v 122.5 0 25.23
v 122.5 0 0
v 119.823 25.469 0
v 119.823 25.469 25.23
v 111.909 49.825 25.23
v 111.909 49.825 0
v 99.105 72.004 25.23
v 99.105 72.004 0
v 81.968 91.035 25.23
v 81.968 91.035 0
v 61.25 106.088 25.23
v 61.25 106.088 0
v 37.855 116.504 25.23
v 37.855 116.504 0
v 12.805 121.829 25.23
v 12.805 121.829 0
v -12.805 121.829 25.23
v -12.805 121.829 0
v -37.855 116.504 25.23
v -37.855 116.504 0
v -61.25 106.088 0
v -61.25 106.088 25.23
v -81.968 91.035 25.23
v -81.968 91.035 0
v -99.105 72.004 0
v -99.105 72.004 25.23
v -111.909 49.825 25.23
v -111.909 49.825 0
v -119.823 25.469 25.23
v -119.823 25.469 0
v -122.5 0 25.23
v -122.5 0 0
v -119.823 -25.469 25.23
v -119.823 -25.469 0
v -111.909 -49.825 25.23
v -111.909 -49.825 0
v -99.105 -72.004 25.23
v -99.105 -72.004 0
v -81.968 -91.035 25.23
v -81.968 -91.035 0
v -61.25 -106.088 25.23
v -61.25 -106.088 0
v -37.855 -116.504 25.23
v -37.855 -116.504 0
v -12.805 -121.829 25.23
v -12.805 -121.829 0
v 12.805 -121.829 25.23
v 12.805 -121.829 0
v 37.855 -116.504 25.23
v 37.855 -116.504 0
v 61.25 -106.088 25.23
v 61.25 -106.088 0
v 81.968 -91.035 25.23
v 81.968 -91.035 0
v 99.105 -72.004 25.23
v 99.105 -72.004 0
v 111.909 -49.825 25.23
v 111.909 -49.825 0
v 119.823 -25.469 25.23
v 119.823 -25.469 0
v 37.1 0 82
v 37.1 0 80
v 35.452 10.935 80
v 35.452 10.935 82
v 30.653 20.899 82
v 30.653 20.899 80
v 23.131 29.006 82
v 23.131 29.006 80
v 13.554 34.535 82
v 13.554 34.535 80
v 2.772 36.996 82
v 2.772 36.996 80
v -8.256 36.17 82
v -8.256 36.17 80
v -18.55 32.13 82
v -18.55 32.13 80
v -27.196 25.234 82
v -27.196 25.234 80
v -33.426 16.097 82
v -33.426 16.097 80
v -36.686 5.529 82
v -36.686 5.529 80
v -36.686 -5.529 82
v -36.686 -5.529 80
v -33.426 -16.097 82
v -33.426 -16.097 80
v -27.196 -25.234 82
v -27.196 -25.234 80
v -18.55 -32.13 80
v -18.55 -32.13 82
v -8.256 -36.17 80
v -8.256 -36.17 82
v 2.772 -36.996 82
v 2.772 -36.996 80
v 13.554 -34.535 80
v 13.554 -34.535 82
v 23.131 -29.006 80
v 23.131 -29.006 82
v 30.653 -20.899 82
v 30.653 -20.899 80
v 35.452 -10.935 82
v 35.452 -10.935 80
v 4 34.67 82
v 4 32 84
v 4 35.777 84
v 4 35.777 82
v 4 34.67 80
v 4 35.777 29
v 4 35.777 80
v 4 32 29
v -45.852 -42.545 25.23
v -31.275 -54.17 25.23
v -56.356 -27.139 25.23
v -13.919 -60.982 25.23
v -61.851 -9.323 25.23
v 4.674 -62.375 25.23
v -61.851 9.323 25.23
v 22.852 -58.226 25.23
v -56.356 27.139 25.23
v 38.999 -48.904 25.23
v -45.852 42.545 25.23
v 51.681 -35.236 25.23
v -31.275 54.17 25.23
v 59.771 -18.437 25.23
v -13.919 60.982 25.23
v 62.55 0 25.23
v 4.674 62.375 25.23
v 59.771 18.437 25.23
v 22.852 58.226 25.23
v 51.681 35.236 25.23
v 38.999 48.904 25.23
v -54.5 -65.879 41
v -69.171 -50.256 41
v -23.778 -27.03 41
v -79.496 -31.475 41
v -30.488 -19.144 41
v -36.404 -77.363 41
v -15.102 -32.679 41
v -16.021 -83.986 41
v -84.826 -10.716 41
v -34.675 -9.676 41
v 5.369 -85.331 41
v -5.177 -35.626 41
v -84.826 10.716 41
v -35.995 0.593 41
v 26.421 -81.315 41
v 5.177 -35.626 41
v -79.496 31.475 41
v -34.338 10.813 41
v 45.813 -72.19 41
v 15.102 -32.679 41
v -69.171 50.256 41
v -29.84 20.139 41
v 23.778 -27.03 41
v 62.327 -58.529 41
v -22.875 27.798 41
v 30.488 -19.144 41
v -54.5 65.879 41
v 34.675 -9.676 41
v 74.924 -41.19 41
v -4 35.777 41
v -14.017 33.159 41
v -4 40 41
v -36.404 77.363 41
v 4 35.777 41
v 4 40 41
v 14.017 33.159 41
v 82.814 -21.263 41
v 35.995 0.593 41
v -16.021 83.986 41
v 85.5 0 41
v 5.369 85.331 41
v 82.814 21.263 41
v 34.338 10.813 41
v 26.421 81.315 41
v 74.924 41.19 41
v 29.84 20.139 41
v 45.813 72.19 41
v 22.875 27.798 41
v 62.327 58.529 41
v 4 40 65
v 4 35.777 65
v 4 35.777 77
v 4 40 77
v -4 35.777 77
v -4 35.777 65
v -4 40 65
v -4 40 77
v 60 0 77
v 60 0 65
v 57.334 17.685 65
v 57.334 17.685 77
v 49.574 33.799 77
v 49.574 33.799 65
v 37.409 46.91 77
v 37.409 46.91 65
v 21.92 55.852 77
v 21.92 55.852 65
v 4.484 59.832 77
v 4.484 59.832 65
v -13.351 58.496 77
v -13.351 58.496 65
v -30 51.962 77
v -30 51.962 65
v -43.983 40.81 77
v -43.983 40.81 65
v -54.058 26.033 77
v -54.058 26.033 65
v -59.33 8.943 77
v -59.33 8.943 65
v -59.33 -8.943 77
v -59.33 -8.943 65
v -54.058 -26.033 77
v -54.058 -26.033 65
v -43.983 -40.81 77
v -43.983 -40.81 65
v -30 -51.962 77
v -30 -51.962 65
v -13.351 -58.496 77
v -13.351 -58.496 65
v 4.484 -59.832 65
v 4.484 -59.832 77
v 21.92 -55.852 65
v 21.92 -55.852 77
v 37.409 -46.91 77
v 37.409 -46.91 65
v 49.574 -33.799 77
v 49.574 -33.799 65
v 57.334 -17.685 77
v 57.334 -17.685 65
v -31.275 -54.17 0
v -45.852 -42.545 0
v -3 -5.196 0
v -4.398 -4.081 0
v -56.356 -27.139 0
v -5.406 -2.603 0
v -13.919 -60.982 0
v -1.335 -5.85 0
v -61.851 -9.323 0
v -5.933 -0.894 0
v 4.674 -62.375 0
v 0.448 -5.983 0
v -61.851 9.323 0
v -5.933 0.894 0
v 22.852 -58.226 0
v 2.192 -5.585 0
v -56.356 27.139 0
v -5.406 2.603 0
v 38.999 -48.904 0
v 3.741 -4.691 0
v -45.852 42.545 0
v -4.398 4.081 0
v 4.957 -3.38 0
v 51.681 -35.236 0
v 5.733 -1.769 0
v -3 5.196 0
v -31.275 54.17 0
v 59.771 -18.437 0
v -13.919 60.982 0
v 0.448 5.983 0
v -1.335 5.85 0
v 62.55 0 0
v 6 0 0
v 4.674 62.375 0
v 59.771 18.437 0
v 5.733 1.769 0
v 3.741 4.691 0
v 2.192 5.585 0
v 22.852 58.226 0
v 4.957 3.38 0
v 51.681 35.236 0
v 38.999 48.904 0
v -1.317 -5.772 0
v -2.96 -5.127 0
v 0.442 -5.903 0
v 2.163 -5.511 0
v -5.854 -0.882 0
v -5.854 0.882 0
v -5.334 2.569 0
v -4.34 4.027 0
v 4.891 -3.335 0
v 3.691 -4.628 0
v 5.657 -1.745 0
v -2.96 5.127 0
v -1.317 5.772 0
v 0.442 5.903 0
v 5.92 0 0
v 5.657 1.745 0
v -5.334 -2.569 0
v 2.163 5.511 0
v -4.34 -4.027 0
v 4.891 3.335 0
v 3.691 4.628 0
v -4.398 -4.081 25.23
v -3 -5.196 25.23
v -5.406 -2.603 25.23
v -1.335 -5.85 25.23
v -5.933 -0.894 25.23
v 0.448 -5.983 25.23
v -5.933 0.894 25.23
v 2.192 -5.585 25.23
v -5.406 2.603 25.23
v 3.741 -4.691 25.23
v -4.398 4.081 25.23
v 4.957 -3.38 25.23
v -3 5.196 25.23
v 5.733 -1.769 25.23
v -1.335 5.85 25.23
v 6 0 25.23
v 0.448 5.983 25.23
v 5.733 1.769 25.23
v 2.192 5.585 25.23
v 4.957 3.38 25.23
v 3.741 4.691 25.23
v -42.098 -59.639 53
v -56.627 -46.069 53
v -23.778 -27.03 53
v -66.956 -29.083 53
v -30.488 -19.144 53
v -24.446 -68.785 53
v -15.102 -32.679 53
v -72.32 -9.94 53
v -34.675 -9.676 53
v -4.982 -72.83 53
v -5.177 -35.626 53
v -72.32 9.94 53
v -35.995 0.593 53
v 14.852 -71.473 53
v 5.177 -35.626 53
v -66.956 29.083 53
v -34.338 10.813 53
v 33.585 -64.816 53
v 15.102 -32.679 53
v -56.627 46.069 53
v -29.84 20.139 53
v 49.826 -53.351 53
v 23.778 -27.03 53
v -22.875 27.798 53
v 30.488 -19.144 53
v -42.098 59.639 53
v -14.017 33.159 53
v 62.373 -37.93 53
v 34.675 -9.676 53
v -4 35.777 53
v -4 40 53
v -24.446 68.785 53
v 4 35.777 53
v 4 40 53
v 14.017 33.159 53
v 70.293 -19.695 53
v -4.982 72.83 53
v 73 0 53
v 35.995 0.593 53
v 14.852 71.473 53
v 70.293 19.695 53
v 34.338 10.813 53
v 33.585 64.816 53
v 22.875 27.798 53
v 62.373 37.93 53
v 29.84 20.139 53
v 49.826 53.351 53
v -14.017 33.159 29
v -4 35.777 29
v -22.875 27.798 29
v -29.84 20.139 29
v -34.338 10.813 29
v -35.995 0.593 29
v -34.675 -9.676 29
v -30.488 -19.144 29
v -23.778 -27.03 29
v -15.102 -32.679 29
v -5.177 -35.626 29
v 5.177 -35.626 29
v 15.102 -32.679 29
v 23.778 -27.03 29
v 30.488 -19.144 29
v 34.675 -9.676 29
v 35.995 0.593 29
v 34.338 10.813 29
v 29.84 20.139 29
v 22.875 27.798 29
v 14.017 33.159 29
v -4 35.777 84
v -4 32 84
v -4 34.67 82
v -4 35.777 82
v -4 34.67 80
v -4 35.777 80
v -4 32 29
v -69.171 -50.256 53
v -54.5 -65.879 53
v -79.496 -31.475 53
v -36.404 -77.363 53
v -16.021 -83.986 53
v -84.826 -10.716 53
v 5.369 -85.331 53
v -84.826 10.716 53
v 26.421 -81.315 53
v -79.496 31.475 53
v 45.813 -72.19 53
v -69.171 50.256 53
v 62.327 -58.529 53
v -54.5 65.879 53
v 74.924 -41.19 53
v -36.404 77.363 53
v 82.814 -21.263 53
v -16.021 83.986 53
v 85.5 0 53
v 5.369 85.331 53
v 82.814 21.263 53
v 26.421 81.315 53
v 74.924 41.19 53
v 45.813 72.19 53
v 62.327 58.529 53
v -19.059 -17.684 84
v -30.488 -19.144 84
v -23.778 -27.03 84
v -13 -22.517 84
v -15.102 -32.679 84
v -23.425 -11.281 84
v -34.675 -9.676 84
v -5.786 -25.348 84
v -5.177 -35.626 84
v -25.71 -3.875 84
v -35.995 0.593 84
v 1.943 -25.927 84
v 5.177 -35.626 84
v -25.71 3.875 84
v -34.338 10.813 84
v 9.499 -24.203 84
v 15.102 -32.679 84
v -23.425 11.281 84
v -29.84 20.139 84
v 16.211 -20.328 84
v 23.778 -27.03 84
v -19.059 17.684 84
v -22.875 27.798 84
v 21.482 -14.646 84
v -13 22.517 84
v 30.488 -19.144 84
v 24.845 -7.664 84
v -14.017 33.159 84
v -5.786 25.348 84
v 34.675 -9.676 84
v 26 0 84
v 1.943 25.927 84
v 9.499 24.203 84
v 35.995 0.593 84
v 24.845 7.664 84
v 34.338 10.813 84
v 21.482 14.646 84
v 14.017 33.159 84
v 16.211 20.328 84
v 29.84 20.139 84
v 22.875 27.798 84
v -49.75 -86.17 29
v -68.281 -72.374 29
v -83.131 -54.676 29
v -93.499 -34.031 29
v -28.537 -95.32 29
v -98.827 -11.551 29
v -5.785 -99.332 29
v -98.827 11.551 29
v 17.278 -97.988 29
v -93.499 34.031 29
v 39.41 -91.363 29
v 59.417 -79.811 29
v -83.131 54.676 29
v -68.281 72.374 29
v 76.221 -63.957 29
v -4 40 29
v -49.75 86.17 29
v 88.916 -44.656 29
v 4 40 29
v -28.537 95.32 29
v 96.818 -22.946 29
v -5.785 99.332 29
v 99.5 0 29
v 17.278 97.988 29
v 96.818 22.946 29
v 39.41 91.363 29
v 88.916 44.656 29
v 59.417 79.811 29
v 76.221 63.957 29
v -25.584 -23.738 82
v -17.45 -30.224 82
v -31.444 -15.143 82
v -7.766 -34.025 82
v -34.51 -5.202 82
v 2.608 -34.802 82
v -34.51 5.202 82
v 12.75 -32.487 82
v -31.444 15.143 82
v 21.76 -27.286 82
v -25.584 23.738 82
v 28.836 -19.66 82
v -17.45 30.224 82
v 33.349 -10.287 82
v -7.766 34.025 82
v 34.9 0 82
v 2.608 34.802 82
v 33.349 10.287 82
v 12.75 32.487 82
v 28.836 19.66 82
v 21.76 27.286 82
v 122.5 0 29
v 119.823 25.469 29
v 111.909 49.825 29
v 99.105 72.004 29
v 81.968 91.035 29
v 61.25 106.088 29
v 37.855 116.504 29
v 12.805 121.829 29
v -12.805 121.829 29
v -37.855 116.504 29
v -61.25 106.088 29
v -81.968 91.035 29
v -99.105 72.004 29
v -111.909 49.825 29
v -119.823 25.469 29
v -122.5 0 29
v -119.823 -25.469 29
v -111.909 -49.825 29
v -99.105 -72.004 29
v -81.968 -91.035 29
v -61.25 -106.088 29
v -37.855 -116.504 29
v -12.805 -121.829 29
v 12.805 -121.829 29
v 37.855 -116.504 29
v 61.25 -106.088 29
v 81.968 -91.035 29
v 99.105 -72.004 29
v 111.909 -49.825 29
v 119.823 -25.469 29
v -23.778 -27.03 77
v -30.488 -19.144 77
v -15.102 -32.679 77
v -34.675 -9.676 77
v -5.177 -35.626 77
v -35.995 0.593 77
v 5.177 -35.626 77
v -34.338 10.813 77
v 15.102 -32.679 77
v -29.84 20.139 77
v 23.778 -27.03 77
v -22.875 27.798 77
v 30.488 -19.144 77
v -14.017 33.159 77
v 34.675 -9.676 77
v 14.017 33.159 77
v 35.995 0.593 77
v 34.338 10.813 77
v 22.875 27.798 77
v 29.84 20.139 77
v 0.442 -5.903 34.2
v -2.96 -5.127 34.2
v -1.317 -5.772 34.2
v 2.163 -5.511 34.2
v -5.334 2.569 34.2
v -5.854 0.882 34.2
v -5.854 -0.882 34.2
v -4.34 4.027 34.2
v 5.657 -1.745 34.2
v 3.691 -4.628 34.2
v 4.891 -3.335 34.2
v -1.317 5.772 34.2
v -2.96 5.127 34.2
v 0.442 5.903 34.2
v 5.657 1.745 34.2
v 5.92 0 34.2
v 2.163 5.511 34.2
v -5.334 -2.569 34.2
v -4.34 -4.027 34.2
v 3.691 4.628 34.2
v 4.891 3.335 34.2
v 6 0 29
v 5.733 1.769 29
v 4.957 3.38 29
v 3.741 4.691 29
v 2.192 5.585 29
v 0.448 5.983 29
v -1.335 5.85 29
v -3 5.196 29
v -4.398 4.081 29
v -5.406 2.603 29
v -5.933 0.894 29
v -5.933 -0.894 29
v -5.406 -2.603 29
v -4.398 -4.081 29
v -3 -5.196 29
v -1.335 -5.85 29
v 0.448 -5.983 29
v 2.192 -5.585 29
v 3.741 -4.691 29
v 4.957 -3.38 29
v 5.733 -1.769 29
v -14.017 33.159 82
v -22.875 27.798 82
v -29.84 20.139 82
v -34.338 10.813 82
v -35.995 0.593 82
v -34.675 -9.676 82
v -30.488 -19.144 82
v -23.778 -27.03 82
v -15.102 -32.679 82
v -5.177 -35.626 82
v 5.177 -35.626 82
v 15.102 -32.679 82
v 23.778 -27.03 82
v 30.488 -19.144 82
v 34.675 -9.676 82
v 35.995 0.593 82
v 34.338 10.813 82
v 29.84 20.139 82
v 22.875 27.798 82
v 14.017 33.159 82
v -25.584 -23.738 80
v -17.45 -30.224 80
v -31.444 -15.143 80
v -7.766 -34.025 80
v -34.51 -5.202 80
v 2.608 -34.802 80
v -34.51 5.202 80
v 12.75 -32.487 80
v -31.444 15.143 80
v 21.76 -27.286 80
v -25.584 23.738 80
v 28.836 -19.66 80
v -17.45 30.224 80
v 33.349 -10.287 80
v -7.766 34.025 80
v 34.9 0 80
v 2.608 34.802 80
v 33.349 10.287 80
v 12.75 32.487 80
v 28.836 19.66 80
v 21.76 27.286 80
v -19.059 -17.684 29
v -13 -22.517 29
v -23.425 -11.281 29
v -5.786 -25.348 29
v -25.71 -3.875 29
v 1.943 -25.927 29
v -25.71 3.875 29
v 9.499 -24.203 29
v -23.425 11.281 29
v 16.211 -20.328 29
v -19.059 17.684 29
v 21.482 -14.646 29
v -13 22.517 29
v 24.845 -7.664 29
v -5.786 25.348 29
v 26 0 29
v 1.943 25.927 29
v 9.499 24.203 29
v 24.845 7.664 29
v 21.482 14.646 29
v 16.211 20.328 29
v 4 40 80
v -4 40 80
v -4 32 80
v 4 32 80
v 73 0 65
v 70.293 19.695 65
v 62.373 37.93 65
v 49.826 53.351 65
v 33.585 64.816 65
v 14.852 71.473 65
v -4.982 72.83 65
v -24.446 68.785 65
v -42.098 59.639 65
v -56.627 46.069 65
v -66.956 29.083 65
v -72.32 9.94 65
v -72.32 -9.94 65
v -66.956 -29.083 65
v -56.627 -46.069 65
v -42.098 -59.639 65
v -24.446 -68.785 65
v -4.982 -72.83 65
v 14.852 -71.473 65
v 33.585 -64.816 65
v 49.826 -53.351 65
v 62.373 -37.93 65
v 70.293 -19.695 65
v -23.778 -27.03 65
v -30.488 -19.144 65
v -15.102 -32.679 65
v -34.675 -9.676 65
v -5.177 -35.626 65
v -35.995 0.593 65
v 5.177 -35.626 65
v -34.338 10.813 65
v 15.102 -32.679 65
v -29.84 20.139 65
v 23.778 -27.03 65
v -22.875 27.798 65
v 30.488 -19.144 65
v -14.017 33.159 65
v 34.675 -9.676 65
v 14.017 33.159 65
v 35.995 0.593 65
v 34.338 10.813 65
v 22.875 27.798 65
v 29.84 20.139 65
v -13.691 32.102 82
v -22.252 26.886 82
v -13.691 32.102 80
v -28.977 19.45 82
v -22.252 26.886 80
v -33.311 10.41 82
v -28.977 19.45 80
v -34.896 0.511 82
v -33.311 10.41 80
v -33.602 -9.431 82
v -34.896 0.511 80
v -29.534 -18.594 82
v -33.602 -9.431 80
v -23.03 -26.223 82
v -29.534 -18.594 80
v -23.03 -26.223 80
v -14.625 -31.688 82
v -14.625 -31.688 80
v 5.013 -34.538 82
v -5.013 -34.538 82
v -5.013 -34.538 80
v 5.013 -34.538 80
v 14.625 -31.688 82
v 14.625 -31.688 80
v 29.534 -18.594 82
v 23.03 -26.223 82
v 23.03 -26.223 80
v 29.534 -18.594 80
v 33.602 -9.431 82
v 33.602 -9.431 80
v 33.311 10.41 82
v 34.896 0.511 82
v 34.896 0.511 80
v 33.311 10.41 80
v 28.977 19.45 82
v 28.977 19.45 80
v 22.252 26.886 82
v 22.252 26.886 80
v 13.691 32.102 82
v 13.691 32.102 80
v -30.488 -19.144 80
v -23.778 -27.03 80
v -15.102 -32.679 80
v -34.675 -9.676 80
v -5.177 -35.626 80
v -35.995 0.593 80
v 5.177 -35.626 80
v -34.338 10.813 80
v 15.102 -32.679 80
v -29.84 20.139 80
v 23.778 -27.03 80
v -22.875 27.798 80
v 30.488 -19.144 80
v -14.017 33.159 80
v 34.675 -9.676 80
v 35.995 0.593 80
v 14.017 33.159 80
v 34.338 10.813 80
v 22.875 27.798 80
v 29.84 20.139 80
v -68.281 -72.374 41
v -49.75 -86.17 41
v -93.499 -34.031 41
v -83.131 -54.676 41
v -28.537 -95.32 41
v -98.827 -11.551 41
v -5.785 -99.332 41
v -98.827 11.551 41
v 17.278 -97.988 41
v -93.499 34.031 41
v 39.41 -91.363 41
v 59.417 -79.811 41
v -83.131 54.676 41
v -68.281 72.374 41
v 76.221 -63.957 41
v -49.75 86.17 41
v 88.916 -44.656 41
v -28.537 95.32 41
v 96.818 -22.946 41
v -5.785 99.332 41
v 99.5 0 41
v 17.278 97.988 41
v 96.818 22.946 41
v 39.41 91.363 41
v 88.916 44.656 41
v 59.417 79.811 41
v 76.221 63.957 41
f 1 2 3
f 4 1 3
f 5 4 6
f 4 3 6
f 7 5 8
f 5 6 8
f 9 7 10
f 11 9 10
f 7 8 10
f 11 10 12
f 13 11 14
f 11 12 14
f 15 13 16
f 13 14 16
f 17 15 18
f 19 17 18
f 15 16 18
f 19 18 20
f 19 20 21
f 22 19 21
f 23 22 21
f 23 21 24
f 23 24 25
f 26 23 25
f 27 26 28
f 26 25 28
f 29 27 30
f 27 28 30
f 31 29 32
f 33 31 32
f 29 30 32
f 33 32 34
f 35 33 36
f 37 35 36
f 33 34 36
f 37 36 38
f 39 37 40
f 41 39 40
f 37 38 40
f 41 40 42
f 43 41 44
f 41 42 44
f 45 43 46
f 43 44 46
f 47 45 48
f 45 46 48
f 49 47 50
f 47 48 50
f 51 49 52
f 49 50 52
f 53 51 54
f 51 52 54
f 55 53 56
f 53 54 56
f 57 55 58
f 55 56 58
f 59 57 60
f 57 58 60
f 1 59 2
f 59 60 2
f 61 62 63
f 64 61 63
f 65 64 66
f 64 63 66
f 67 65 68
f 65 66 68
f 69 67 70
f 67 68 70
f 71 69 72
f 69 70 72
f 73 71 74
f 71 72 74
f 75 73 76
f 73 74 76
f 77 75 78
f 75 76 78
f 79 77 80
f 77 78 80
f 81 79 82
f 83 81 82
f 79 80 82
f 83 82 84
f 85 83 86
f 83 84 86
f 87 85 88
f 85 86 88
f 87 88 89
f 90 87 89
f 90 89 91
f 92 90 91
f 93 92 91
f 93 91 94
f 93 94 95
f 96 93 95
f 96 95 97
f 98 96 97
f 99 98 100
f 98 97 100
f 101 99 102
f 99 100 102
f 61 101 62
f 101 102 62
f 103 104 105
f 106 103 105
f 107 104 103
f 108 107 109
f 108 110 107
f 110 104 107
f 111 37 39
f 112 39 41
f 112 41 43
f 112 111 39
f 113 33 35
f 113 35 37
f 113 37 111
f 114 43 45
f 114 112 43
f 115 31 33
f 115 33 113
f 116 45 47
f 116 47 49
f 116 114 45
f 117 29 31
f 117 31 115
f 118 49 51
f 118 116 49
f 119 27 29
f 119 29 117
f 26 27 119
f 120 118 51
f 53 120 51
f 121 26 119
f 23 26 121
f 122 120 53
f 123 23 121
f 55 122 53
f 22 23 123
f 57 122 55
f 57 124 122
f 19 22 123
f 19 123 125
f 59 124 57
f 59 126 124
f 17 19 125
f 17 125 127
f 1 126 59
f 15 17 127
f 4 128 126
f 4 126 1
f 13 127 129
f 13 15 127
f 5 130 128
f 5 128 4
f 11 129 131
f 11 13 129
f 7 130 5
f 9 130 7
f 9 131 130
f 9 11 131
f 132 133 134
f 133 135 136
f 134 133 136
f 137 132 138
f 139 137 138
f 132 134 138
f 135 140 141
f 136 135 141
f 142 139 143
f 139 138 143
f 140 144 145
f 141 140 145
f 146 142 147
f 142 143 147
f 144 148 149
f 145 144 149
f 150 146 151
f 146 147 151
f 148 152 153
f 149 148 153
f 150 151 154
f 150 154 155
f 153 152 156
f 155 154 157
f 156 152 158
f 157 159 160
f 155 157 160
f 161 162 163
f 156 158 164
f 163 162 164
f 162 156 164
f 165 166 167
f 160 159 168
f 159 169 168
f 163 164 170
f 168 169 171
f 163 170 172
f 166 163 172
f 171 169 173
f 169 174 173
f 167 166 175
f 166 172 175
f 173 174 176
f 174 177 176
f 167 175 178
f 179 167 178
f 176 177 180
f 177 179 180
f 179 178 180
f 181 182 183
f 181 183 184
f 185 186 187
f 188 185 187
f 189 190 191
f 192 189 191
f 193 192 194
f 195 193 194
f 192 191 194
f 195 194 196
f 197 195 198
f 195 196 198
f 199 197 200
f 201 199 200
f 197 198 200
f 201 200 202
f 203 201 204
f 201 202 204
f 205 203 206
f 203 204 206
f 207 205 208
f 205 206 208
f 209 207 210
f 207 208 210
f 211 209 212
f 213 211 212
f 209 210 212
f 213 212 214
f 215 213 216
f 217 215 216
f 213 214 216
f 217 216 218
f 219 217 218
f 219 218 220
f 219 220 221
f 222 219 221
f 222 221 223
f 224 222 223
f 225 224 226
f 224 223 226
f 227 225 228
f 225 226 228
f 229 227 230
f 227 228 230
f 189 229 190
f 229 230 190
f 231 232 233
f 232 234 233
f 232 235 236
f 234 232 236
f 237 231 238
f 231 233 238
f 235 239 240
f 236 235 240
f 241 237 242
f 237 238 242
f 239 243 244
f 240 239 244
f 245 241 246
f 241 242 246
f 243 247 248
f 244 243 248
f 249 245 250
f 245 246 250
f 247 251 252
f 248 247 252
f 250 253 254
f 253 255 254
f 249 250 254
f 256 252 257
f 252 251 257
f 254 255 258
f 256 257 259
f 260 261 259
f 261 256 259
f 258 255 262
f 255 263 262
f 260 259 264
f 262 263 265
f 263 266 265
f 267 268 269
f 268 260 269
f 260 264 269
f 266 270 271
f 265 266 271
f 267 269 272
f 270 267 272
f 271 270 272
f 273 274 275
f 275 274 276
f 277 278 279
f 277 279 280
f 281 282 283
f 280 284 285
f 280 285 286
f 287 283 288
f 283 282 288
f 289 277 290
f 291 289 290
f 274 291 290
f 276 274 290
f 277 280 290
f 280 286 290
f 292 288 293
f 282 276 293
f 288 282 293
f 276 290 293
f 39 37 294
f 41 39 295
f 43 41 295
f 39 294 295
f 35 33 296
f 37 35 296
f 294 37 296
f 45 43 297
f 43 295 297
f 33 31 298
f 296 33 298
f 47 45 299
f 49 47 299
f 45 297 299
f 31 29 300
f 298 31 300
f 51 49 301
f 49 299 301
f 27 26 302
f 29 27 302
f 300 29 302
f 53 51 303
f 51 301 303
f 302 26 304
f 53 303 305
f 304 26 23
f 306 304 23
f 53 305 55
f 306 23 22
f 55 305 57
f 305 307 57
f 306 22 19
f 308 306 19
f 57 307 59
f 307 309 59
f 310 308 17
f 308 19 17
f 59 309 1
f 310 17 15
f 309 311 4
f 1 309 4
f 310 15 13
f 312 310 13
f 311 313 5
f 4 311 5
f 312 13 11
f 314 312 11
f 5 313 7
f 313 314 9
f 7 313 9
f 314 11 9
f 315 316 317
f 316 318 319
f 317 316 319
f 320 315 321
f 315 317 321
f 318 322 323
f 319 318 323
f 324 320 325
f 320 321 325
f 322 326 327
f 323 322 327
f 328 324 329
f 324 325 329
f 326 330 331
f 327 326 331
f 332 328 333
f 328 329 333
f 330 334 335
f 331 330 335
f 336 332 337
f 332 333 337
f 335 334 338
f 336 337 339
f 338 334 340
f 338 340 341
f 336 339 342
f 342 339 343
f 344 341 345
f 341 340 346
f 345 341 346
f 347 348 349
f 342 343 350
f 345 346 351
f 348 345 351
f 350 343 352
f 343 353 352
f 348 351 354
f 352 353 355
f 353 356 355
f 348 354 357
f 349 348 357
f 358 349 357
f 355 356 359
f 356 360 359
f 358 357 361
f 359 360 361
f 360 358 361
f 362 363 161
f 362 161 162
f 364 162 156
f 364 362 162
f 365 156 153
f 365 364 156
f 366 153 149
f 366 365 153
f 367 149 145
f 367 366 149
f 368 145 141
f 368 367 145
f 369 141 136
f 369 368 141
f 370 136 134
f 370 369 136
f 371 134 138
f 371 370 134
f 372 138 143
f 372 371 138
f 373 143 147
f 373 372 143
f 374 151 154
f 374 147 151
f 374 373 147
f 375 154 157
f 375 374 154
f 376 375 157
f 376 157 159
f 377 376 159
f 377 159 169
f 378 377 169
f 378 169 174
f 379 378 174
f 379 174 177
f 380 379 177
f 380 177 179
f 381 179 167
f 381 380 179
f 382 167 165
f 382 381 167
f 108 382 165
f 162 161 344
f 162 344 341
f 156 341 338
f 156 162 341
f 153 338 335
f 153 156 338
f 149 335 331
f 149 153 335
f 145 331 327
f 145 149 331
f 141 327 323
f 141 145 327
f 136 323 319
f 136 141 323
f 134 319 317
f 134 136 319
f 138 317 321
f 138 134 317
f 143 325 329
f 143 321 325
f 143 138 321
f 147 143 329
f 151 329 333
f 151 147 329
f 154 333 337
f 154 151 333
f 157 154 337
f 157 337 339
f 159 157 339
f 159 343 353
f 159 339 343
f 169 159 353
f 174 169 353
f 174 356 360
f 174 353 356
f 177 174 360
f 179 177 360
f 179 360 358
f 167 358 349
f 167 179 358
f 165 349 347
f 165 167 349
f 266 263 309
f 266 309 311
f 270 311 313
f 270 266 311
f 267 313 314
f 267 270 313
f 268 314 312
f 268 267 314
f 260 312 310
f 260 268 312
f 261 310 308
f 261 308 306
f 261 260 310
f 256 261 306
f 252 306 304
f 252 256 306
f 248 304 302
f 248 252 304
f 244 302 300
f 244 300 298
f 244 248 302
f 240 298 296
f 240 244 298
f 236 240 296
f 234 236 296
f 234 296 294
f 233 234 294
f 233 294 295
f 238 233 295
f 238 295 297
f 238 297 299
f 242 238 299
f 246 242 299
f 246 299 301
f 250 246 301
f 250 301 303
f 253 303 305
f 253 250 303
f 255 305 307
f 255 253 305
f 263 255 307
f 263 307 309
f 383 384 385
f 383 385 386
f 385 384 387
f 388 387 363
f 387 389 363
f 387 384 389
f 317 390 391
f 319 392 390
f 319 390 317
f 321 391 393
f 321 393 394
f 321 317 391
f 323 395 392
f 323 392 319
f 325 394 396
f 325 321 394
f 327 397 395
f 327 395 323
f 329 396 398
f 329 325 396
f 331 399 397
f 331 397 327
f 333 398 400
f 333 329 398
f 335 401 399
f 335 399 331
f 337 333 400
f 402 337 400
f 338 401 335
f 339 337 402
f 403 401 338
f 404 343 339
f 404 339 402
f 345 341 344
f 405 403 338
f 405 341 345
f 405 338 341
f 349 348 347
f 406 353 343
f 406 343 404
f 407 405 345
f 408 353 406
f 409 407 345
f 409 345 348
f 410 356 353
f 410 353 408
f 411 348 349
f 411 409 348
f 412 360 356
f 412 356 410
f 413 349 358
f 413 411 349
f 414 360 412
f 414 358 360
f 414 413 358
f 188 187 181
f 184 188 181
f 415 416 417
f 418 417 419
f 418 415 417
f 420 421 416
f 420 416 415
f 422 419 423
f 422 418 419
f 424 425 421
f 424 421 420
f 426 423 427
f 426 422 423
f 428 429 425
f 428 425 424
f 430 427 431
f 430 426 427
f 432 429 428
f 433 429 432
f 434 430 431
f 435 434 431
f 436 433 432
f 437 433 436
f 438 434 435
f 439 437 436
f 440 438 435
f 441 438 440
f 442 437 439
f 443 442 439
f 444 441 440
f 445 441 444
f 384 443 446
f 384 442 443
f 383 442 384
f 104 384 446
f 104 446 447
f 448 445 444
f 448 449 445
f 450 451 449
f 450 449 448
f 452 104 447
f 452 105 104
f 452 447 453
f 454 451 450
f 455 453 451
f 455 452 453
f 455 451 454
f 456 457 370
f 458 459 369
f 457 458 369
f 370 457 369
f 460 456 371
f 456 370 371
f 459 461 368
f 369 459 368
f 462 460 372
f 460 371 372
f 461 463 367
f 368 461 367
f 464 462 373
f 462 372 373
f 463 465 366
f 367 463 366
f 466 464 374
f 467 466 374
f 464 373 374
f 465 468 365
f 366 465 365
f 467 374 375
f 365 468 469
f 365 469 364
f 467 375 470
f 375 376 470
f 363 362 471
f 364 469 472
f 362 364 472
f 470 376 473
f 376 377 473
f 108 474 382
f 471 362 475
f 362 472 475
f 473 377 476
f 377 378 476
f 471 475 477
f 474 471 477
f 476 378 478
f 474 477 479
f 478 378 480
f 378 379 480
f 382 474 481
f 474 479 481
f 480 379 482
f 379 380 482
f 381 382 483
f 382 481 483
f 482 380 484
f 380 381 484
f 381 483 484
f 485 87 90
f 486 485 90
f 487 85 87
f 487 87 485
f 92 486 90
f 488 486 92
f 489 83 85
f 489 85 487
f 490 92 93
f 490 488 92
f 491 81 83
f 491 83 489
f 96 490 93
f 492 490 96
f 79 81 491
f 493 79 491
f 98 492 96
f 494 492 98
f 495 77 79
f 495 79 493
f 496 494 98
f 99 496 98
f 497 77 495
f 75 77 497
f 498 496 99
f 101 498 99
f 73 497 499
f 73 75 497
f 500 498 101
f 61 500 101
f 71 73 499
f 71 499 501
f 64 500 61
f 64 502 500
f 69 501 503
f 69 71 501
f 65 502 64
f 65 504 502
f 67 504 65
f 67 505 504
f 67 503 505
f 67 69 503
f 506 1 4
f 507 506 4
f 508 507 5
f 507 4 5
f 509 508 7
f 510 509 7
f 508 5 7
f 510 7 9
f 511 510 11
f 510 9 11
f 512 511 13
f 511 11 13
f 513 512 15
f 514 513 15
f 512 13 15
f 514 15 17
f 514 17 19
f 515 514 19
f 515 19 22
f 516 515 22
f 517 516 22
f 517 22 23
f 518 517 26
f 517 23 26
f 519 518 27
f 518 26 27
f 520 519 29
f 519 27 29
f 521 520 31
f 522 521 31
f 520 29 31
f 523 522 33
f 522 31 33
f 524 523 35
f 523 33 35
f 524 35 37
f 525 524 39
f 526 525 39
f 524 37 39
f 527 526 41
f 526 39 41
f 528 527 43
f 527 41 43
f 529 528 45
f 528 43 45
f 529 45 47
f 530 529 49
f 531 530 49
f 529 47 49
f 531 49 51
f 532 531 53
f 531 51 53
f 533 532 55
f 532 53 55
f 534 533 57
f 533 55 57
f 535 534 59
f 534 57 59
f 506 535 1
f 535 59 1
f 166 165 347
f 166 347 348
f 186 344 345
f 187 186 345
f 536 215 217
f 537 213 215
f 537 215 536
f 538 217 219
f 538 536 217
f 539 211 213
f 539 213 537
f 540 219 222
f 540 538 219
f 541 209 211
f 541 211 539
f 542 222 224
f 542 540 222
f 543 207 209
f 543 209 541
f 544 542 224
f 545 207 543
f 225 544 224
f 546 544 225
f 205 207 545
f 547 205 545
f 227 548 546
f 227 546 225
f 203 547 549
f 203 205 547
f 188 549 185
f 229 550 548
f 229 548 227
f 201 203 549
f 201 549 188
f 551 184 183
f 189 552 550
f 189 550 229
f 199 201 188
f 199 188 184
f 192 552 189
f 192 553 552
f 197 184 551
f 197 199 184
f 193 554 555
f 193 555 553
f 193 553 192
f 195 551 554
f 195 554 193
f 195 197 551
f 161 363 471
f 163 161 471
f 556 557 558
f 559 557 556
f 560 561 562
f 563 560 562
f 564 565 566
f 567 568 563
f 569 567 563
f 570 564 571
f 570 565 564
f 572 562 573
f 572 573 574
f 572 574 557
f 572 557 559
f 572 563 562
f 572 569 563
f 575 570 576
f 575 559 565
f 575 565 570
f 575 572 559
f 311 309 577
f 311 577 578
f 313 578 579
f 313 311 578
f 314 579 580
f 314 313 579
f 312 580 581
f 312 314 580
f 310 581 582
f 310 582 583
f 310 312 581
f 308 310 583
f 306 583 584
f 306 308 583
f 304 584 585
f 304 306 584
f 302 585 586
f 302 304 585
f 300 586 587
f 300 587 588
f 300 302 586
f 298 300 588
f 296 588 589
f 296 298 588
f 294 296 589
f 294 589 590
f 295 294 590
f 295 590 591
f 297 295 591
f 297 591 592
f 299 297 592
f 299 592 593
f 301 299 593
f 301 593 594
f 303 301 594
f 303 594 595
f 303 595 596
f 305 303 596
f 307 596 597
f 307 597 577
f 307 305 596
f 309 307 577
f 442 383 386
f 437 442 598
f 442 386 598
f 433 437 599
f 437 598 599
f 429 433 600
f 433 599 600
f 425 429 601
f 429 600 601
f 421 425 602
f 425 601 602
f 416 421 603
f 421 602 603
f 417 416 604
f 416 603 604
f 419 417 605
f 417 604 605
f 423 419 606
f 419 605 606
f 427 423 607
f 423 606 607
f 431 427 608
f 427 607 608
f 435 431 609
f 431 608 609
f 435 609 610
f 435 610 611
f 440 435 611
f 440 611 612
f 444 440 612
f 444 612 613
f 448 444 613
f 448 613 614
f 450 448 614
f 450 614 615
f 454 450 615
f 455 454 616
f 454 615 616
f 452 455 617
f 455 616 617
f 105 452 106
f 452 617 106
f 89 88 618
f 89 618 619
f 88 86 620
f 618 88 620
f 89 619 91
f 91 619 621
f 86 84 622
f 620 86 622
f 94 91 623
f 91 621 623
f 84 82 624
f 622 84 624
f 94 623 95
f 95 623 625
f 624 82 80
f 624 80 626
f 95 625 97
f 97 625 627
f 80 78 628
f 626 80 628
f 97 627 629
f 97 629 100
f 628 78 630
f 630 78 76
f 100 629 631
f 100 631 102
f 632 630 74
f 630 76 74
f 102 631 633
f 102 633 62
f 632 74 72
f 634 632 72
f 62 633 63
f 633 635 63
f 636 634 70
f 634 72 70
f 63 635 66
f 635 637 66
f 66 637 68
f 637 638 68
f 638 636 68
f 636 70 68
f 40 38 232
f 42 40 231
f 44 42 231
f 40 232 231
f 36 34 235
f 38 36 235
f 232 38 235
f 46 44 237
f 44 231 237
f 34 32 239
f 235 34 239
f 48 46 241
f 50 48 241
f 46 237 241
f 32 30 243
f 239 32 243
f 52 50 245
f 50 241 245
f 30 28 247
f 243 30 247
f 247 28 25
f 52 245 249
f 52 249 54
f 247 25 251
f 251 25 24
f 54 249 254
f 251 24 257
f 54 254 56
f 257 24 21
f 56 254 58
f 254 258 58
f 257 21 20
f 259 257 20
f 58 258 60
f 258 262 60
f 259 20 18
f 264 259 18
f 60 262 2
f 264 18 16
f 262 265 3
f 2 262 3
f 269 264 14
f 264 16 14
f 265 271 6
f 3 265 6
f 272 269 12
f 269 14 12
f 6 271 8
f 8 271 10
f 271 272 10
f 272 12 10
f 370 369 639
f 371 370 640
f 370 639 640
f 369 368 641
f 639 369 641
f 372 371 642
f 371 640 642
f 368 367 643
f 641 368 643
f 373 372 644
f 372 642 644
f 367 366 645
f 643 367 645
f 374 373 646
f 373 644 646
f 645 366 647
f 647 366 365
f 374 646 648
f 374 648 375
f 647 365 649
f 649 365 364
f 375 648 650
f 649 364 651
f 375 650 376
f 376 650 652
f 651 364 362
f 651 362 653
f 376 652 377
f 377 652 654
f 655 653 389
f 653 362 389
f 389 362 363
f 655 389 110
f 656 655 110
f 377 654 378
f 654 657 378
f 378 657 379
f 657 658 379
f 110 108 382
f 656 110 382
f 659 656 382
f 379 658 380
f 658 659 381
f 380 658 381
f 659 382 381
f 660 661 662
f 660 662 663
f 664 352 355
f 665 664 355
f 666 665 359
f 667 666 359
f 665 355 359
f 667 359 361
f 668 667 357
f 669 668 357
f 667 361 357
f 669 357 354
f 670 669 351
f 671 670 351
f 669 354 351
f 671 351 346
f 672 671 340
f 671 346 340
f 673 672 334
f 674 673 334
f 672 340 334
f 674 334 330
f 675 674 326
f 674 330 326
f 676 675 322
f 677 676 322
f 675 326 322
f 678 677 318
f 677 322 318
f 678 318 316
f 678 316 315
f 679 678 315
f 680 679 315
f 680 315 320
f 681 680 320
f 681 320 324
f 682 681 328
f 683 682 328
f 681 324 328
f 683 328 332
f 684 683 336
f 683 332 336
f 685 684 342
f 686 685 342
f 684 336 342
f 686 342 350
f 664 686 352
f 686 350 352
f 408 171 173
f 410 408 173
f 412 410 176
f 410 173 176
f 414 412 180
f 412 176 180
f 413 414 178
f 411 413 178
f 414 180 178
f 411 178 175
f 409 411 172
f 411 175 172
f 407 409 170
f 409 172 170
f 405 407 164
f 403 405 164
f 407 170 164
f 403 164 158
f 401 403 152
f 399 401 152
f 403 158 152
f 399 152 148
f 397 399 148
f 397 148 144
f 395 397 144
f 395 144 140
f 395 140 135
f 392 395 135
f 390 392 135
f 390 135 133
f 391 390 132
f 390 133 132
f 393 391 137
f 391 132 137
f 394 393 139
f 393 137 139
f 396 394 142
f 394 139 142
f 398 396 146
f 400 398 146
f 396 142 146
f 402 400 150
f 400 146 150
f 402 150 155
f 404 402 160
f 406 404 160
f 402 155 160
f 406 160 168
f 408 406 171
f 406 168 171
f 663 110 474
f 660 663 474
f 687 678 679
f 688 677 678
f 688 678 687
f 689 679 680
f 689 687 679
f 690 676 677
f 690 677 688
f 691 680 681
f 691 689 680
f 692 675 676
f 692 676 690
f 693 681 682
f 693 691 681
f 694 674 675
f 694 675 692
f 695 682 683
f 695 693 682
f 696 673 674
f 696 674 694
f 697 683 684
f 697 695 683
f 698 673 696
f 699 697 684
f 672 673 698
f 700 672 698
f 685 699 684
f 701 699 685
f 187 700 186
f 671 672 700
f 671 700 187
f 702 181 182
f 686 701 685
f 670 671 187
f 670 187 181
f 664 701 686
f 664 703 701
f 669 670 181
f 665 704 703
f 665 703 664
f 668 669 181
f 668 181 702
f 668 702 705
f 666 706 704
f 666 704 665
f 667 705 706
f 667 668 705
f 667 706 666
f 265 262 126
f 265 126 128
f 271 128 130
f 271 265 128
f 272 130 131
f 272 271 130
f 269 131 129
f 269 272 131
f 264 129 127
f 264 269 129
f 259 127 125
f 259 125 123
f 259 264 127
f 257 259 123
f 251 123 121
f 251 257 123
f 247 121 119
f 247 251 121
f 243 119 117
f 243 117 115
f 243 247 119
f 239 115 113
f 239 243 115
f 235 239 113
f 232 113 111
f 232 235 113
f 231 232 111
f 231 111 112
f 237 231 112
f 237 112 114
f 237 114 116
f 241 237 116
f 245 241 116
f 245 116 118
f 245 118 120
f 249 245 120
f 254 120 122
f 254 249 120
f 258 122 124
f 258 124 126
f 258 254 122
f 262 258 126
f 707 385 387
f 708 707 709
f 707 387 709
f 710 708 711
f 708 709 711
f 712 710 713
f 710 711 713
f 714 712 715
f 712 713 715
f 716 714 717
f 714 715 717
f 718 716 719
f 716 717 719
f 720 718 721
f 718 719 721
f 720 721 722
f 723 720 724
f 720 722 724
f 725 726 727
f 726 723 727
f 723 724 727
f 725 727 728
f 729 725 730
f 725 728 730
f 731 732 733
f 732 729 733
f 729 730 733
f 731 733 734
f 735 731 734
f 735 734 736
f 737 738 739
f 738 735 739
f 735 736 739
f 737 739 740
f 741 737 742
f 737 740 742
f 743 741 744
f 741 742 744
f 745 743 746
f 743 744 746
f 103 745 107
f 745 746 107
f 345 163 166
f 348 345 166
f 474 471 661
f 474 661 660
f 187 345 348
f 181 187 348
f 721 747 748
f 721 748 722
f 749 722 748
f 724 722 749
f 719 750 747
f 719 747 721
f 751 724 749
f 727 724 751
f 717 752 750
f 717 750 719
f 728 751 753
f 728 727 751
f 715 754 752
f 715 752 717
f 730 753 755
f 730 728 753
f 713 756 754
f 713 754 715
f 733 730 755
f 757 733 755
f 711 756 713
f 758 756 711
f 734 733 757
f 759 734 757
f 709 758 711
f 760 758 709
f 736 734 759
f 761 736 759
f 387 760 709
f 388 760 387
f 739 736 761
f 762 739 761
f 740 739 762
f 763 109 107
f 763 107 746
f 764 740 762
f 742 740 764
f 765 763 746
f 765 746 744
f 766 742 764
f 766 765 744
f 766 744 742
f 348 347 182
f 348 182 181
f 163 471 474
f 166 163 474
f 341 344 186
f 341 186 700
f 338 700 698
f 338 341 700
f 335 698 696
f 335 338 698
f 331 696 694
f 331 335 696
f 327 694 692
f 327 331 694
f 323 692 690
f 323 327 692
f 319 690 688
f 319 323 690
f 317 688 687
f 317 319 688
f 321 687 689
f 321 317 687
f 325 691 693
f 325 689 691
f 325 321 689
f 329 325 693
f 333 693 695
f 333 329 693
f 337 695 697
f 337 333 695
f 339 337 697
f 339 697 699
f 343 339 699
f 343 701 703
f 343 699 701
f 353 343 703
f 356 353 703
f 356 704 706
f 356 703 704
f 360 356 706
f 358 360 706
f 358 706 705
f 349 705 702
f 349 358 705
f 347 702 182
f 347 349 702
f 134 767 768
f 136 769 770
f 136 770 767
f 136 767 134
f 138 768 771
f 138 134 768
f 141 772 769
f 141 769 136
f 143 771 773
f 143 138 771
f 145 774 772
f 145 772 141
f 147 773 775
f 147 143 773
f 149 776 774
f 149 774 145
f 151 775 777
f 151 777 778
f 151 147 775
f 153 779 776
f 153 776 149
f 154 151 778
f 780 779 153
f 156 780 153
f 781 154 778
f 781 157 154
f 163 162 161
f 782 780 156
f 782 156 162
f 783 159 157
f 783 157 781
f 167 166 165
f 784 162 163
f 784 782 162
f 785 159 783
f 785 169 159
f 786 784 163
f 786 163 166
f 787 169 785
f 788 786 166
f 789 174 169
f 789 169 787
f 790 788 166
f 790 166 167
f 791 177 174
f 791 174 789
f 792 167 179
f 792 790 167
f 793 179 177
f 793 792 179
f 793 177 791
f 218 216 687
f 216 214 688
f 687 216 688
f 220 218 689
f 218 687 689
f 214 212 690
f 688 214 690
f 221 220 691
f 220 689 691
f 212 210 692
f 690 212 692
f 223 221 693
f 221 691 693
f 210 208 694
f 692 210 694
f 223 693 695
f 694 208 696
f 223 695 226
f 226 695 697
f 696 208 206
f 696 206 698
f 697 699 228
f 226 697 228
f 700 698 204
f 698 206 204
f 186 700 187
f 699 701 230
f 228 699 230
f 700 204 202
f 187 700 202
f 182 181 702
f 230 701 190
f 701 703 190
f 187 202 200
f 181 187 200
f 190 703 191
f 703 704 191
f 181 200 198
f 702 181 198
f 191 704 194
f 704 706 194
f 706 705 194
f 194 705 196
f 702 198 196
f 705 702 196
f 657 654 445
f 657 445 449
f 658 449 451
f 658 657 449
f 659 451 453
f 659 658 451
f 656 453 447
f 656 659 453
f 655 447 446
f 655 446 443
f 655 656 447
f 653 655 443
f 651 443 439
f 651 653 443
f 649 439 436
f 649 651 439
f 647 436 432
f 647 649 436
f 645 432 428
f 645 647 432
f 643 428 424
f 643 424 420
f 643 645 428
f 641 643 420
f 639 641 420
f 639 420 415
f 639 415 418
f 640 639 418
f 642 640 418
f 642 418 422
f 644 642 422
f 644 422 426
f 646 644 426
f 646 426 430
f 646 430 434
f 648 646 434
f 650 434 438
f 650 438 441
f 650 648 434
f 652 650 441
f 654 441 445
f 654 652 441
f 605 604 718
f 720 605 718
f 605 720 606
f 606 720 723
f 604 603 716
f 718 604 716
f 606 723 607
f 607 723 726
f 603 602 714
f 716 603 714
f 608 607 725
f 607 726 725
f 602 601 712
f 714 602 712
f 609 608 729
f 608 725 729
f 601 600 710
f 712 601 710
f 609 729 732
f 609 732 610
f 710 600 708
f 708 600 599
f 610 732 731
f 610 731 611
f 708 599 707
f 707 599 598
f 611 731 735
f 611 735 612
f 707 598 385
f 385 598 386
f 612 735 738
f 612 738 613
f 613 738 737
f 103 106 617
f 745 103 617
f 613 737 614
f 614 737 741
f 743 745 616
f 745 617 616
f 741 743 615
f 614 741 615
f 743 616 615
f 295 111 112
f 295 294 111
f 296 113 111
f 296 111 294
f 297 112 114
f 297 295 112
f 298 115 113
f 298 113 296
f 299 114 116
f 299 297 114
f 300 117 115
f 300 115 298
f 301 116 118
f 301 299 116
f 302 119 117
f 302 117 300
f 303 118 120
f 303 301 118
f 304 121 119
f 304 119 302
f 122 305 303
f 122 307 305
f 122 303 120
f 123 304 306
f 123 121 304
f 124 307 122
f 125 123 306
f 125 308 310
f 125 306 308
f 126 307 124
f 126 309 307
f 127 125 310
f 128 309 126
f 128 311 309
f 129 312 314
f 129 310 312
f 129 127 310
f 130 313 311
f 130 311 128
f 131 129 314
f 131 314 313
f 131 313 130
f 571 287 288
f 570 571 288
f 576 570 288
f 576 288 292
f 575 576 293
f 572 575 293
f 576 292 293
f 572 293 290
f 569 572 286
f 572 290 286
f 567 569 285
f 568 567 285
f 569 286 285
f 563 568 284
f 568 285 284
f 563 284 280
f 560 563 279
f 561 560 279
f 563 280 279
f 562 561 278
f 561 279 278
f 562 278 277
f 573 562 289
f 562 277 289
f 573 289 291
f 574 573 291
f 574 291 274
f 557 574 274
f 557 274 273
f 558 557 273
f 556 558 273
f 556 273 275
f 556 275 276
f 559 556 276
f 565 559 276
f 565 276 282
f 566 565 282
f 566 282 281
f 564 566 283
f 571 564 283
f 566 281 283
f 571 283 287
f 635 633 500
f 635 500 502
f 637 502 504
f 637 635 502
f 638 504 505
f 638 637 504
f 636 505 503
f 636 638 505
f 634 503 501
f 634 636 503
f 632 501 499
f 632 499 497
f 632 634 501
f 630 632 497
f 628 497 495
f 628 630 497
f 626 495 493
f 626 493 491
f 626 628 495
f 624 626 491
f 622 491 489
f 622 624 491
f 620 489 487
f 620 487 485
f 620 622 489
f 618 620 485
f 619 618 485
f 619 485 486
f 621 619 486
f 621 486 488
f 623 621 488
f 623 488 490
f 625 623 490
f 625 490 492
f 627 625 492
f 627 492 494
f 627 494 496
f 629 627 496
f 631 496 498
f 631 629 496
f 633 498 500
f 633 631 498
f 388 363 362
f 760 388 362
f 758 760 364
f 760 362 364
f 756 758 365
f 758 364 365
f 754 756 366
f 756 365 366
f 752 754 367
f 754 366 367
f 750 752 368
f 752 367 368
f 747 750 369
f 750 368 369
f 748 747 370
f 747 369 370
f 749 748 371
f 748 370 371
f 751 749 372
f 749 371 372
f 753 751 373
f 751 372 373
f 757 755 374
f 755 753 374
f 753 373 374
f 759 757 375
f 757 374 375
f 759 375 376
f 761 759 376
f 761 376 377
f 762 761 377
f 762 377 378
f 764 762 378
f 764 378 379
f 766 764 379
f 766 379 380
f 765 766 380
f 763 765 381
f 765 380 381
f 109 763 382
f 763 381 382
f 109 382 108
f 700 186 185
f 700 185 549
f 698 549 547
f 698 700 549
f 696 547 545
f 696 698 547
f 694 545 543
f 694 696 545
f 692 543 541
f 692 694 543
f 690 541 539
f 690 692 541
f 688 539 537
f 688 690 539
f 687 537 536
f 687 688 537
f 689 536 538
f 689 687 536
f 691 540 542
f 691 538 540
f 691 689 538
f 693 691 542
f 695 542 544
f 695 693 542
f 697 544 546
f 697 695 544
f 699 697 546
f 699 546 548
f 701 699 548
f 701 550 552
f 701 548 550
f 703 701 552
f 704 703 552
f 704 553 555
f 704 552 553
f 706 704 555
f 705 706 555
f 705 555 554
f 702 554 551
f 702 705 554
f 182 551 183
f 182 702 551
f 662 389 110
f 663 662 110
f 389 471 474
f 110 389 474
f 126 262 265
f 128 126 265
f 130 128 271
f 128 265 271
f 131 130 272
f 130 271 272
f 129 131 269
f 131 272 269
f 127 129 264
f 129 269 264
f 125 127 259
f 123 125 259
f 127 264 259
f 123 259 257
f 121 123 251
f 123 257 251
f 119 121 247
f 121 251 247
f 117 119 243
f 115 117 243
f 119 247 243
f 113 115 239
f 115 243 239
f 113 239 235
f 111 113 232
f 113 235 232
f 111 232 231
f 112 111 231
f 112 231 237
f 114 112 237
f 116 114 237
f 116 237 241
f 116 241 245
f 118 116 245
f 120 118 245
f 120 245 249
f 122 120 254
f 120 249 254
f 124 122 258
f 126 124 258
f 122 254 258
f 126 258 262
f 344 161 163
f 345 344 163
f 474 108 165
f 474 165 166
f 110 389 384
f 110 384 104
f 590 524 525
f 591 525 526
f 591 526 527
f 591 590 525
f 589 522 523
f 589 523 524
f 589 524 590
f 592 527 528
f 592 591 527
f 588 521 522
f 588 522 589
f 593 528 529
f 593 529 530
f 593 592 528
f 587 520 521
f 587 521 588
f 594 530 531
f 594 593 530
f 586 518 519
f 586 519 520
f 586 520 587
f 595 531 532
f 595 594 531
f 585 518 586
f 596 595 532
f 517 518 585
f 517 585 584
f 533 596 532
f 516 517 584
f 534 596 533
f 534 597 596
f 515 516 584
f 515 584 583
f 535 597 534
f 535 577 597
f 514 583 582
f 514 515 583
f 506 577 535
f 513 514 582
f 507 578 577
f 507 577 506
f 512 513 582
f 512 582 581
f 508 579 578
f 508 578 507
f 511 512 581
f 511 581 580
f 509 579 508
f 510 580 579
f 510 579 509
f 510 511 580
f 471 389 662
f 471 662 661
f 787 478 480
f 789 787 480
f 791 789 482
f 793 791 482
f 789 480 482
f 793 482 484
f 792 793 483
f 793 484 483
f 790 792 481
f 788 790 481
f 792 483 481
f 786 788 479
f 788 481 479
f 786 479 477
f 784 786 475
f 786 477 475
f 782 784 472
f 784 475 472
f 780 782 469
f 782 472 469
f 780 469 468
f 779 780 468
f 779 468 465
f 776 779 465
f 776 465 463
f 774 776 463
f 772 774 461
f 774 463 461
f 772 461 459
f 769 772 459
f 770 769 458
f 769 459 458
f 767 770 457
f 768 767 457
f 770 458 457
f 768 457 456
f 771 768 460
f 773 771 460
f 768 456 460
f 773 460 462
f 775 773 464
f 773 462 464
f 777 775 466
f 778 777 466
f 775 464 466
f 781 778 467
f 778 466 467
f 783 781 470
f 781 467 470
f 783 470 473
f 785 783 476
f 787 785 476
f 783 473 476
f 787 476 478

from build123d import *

# Parameters (mm, degrees)
TUBE_R                  = 122.5
TUBE_R_2                = 62.55
TUBE_DEPTH              = 25.23
TUBE001_R               = 62.55
TUBE001_R_2             = 6
TUBE001_DEPTH           = 25.23
TUBE002_R               = 122.5
TUBE002_R_2             = 6
TUBE002_DEPTH           = 3.77
BOX_W                   = 8
BOX_H                   = 8
BOX_DEPTH               = 55
TUBE004_R               = 99.5
TUBE004_R_2             = 36
TUBE004_DEPTH           = 12
TUBE005_R               = 85.5
TUBE005_R_2             = 36
TUBE005_DEPTH           = 12
TUBE006_R               = 73
TUBE006_R_2             = 36
TUBE006_DEPTH           = 12
BOX001_W                = 8
BOX001_H                = 8
BOX001_DEPTH            = 51
CYLINDER_R              = 5.92
CYLINDER_DEPTH          = 34.2
TUBE008_R               = 36
TUBE008_R_2             = 34.9
TUBE008_DEPTH           = 2
TUBE008_PLACEMENT_ANGLE = 3
TUBE003_R               = 36
TUBE003_R_2             = 26
TUBE003_DEPTH           = 55
TUBE009_R               = 60
TUBE009_R_2             = 36
TUBE009_DEPTH           = 12
TUBE010_R               = 37.1
TUBE010_R_2             = 34.9
TUBE010_DEPTH           = 2


with BuildPart() as flywheel:
    # Tube → Tube (new body)
    with BuildSketch(Plane.XY):
        Circle(TUBE_R)
        Circle(TUBE_R_2, mode=Mode.SUBTRACT)
    extrude(amount=TUBE_DEPTH)


with BuildPart() as disk:
    # Tube001 → Tube001 (new body)
    with BuildSketch(Plane.XY):
        Circle(TUBE001_R)
        Circle(TUBE001_R_2, mode=Mode.SUBTRACT)
    extrude(amount=TUBE001_DEPTH)


with BuildPart() as hub:
    # Tube002 → Tube002 (new body)
    with BuildSketch(Plane.XY.offset(25.23)):
        Circle(TUBE002_R)
        Circle(TUBE002_R_2, mode=Mode.SUBTRACT)
    extrude(amount=TUBE002_DEPTH)


with BuildPart() as wp_ed_key:
    # Box → Box (new body)
    with BuildSketch(Plane(origin=(-4, 32, 29), x_dir=(1, 0, 0), z_dir=(0, 0, 1))):
        with Locations((4, 4)):
            Rectangle(BOX_W, BOX_H)
    extrude(amount=BOX_DEPTH)


with BuildPart() as w1_keyed:
    # Tube004 → Tube004 (new body)
    with BuildSketch(Plane.XY.offset(29)):
        Circle(TUBE004_R)
        Circle(TUBE004_R_2, mode=Mode.SUBTRACT)
    extrude(amount=TUBE004_DEPTH)

    # Cut001: cut wp_ed_key
    add(wp_ed_key.part, mode=Mode.SUBTRACT)


with BuildPart() as w2_keyed:
    # Tube005 → Tube005 (new body)
    with BuildSketch(Plane.XY.offset(41)):
        Circle(TUBE005_R)
        Circle(TUBE005_R_2, mode=Mode.SUBTRACT)
    extrude(amount=TUBE005_DEPTH)

    # Cut002: cut wp_ed_key
    add(wp_ed_key.part, mode=Mode.SUBTRACT)


with BuildPart() as w3_keyed:
    # Tube006 → Tube006 (new body)
    with BuildSketch(Plane.XY.offset(53)):
        Circle(TUBE006_R)
        Circle(TUBE006_R_2, mode=Mode.SUBTRACT)
    extrude(amount=TUBE006_DEPTH)

    # Cut003: cut wp_ed_key
    add(wp_ed_key.part, mode=Mode.SUBTRACT)


with BuildPart() as key:
    # Box001 → Box001 (new body)
    with BuildSketch(Plane(origin=(-4, 32, 29), x_dir=(1, 0, 0), z_dir=(0, 0, 1))):
        with Locations((4, 4)):
            Rectangle(BOX001_W, BOX001_H)
    extrude(amount=BOX001_DEPTH)


with BuildPart() as threadedshaft:
    # Cylinder → Cylinder (new body)
    with BuildSketch(Plane.XY):
        Circle(CYLINDER_R)
    extrude(amount=CYLINDER_DEPTH)


with BuildPart() as circlip_grove:
    # Tube008 → Tube008 (new body)
    with BuildSketch(Plane.XY):
        Circle(TUBE008_R)
        Circle(TUBE008_R_2, mode=Mode.SUBTRACT)
    extrude(amount=TUBE008_DEPTH)


with BuildPart() as circlip_grove_1:
    # Tube008 placement: moved
    add(circlip_grove.part.moved(Location((0, 0, 80))).rotate(Axis((0, 0, 80), (0, 0, -1)), TUBE008_PLACEMENT_ANGLE))


with BuildPart() as grove_and_key:
    # Body base: copy of wp_ed_key
    add(wp_ed_key.part)

    # Fusion: union circlip_grove
    add(circlip_grove_1.part)


with BuildPart() as extendingdisk_grovedndkeyed:
    # Tube003 → Tube003 (new body)
    with BuildSketch(Plane.XY.offset(29)):
        Circle(TUBE003_R)
        Circle(TUBE003_R_2, mode=Mode.SUBTRACT)
    extrude(amount=TUBE003_DEPTH)

    # Cut: cut grove_and_key
    add(grove_and_key.part, mode=Mode.SUBTRACT)


with BuildPart() as w4_keyed:
    # Tube009 → Tube009 (new body)
    with BuildSketch(Plane.XY.offset(65)):
        Circle(TUBE009_R)
        Circle(TUBE009_R_2, mode=Mode.SUBTRACT)
    extrude(amount=TUBE009_DEPTH)

    # Cut004: cut wp_ed_key
    add(wp_ed_key.part, mode=Mode.SUBTRACT)


with BuildPart() as circlip:
    # Tube010 → Tube010 (new body)
    with BuildSketch(Plane.XY.offset(80)):
        Circle(TUBE010_R)
        Circle(TUBE010_R_2, mode=Mode.SUBTRACT)
    extrude(amount=TUBE010_DEPTH)


solid = Compound([flywheel.part, disk.part, hub.part, w1_keyed.part, w2_keyed.part, w3_keyed.part, key.part, threadedshaft.part, extendingdisk_grovedndkeyed.part, w4_keyed.part, circlip.part])
